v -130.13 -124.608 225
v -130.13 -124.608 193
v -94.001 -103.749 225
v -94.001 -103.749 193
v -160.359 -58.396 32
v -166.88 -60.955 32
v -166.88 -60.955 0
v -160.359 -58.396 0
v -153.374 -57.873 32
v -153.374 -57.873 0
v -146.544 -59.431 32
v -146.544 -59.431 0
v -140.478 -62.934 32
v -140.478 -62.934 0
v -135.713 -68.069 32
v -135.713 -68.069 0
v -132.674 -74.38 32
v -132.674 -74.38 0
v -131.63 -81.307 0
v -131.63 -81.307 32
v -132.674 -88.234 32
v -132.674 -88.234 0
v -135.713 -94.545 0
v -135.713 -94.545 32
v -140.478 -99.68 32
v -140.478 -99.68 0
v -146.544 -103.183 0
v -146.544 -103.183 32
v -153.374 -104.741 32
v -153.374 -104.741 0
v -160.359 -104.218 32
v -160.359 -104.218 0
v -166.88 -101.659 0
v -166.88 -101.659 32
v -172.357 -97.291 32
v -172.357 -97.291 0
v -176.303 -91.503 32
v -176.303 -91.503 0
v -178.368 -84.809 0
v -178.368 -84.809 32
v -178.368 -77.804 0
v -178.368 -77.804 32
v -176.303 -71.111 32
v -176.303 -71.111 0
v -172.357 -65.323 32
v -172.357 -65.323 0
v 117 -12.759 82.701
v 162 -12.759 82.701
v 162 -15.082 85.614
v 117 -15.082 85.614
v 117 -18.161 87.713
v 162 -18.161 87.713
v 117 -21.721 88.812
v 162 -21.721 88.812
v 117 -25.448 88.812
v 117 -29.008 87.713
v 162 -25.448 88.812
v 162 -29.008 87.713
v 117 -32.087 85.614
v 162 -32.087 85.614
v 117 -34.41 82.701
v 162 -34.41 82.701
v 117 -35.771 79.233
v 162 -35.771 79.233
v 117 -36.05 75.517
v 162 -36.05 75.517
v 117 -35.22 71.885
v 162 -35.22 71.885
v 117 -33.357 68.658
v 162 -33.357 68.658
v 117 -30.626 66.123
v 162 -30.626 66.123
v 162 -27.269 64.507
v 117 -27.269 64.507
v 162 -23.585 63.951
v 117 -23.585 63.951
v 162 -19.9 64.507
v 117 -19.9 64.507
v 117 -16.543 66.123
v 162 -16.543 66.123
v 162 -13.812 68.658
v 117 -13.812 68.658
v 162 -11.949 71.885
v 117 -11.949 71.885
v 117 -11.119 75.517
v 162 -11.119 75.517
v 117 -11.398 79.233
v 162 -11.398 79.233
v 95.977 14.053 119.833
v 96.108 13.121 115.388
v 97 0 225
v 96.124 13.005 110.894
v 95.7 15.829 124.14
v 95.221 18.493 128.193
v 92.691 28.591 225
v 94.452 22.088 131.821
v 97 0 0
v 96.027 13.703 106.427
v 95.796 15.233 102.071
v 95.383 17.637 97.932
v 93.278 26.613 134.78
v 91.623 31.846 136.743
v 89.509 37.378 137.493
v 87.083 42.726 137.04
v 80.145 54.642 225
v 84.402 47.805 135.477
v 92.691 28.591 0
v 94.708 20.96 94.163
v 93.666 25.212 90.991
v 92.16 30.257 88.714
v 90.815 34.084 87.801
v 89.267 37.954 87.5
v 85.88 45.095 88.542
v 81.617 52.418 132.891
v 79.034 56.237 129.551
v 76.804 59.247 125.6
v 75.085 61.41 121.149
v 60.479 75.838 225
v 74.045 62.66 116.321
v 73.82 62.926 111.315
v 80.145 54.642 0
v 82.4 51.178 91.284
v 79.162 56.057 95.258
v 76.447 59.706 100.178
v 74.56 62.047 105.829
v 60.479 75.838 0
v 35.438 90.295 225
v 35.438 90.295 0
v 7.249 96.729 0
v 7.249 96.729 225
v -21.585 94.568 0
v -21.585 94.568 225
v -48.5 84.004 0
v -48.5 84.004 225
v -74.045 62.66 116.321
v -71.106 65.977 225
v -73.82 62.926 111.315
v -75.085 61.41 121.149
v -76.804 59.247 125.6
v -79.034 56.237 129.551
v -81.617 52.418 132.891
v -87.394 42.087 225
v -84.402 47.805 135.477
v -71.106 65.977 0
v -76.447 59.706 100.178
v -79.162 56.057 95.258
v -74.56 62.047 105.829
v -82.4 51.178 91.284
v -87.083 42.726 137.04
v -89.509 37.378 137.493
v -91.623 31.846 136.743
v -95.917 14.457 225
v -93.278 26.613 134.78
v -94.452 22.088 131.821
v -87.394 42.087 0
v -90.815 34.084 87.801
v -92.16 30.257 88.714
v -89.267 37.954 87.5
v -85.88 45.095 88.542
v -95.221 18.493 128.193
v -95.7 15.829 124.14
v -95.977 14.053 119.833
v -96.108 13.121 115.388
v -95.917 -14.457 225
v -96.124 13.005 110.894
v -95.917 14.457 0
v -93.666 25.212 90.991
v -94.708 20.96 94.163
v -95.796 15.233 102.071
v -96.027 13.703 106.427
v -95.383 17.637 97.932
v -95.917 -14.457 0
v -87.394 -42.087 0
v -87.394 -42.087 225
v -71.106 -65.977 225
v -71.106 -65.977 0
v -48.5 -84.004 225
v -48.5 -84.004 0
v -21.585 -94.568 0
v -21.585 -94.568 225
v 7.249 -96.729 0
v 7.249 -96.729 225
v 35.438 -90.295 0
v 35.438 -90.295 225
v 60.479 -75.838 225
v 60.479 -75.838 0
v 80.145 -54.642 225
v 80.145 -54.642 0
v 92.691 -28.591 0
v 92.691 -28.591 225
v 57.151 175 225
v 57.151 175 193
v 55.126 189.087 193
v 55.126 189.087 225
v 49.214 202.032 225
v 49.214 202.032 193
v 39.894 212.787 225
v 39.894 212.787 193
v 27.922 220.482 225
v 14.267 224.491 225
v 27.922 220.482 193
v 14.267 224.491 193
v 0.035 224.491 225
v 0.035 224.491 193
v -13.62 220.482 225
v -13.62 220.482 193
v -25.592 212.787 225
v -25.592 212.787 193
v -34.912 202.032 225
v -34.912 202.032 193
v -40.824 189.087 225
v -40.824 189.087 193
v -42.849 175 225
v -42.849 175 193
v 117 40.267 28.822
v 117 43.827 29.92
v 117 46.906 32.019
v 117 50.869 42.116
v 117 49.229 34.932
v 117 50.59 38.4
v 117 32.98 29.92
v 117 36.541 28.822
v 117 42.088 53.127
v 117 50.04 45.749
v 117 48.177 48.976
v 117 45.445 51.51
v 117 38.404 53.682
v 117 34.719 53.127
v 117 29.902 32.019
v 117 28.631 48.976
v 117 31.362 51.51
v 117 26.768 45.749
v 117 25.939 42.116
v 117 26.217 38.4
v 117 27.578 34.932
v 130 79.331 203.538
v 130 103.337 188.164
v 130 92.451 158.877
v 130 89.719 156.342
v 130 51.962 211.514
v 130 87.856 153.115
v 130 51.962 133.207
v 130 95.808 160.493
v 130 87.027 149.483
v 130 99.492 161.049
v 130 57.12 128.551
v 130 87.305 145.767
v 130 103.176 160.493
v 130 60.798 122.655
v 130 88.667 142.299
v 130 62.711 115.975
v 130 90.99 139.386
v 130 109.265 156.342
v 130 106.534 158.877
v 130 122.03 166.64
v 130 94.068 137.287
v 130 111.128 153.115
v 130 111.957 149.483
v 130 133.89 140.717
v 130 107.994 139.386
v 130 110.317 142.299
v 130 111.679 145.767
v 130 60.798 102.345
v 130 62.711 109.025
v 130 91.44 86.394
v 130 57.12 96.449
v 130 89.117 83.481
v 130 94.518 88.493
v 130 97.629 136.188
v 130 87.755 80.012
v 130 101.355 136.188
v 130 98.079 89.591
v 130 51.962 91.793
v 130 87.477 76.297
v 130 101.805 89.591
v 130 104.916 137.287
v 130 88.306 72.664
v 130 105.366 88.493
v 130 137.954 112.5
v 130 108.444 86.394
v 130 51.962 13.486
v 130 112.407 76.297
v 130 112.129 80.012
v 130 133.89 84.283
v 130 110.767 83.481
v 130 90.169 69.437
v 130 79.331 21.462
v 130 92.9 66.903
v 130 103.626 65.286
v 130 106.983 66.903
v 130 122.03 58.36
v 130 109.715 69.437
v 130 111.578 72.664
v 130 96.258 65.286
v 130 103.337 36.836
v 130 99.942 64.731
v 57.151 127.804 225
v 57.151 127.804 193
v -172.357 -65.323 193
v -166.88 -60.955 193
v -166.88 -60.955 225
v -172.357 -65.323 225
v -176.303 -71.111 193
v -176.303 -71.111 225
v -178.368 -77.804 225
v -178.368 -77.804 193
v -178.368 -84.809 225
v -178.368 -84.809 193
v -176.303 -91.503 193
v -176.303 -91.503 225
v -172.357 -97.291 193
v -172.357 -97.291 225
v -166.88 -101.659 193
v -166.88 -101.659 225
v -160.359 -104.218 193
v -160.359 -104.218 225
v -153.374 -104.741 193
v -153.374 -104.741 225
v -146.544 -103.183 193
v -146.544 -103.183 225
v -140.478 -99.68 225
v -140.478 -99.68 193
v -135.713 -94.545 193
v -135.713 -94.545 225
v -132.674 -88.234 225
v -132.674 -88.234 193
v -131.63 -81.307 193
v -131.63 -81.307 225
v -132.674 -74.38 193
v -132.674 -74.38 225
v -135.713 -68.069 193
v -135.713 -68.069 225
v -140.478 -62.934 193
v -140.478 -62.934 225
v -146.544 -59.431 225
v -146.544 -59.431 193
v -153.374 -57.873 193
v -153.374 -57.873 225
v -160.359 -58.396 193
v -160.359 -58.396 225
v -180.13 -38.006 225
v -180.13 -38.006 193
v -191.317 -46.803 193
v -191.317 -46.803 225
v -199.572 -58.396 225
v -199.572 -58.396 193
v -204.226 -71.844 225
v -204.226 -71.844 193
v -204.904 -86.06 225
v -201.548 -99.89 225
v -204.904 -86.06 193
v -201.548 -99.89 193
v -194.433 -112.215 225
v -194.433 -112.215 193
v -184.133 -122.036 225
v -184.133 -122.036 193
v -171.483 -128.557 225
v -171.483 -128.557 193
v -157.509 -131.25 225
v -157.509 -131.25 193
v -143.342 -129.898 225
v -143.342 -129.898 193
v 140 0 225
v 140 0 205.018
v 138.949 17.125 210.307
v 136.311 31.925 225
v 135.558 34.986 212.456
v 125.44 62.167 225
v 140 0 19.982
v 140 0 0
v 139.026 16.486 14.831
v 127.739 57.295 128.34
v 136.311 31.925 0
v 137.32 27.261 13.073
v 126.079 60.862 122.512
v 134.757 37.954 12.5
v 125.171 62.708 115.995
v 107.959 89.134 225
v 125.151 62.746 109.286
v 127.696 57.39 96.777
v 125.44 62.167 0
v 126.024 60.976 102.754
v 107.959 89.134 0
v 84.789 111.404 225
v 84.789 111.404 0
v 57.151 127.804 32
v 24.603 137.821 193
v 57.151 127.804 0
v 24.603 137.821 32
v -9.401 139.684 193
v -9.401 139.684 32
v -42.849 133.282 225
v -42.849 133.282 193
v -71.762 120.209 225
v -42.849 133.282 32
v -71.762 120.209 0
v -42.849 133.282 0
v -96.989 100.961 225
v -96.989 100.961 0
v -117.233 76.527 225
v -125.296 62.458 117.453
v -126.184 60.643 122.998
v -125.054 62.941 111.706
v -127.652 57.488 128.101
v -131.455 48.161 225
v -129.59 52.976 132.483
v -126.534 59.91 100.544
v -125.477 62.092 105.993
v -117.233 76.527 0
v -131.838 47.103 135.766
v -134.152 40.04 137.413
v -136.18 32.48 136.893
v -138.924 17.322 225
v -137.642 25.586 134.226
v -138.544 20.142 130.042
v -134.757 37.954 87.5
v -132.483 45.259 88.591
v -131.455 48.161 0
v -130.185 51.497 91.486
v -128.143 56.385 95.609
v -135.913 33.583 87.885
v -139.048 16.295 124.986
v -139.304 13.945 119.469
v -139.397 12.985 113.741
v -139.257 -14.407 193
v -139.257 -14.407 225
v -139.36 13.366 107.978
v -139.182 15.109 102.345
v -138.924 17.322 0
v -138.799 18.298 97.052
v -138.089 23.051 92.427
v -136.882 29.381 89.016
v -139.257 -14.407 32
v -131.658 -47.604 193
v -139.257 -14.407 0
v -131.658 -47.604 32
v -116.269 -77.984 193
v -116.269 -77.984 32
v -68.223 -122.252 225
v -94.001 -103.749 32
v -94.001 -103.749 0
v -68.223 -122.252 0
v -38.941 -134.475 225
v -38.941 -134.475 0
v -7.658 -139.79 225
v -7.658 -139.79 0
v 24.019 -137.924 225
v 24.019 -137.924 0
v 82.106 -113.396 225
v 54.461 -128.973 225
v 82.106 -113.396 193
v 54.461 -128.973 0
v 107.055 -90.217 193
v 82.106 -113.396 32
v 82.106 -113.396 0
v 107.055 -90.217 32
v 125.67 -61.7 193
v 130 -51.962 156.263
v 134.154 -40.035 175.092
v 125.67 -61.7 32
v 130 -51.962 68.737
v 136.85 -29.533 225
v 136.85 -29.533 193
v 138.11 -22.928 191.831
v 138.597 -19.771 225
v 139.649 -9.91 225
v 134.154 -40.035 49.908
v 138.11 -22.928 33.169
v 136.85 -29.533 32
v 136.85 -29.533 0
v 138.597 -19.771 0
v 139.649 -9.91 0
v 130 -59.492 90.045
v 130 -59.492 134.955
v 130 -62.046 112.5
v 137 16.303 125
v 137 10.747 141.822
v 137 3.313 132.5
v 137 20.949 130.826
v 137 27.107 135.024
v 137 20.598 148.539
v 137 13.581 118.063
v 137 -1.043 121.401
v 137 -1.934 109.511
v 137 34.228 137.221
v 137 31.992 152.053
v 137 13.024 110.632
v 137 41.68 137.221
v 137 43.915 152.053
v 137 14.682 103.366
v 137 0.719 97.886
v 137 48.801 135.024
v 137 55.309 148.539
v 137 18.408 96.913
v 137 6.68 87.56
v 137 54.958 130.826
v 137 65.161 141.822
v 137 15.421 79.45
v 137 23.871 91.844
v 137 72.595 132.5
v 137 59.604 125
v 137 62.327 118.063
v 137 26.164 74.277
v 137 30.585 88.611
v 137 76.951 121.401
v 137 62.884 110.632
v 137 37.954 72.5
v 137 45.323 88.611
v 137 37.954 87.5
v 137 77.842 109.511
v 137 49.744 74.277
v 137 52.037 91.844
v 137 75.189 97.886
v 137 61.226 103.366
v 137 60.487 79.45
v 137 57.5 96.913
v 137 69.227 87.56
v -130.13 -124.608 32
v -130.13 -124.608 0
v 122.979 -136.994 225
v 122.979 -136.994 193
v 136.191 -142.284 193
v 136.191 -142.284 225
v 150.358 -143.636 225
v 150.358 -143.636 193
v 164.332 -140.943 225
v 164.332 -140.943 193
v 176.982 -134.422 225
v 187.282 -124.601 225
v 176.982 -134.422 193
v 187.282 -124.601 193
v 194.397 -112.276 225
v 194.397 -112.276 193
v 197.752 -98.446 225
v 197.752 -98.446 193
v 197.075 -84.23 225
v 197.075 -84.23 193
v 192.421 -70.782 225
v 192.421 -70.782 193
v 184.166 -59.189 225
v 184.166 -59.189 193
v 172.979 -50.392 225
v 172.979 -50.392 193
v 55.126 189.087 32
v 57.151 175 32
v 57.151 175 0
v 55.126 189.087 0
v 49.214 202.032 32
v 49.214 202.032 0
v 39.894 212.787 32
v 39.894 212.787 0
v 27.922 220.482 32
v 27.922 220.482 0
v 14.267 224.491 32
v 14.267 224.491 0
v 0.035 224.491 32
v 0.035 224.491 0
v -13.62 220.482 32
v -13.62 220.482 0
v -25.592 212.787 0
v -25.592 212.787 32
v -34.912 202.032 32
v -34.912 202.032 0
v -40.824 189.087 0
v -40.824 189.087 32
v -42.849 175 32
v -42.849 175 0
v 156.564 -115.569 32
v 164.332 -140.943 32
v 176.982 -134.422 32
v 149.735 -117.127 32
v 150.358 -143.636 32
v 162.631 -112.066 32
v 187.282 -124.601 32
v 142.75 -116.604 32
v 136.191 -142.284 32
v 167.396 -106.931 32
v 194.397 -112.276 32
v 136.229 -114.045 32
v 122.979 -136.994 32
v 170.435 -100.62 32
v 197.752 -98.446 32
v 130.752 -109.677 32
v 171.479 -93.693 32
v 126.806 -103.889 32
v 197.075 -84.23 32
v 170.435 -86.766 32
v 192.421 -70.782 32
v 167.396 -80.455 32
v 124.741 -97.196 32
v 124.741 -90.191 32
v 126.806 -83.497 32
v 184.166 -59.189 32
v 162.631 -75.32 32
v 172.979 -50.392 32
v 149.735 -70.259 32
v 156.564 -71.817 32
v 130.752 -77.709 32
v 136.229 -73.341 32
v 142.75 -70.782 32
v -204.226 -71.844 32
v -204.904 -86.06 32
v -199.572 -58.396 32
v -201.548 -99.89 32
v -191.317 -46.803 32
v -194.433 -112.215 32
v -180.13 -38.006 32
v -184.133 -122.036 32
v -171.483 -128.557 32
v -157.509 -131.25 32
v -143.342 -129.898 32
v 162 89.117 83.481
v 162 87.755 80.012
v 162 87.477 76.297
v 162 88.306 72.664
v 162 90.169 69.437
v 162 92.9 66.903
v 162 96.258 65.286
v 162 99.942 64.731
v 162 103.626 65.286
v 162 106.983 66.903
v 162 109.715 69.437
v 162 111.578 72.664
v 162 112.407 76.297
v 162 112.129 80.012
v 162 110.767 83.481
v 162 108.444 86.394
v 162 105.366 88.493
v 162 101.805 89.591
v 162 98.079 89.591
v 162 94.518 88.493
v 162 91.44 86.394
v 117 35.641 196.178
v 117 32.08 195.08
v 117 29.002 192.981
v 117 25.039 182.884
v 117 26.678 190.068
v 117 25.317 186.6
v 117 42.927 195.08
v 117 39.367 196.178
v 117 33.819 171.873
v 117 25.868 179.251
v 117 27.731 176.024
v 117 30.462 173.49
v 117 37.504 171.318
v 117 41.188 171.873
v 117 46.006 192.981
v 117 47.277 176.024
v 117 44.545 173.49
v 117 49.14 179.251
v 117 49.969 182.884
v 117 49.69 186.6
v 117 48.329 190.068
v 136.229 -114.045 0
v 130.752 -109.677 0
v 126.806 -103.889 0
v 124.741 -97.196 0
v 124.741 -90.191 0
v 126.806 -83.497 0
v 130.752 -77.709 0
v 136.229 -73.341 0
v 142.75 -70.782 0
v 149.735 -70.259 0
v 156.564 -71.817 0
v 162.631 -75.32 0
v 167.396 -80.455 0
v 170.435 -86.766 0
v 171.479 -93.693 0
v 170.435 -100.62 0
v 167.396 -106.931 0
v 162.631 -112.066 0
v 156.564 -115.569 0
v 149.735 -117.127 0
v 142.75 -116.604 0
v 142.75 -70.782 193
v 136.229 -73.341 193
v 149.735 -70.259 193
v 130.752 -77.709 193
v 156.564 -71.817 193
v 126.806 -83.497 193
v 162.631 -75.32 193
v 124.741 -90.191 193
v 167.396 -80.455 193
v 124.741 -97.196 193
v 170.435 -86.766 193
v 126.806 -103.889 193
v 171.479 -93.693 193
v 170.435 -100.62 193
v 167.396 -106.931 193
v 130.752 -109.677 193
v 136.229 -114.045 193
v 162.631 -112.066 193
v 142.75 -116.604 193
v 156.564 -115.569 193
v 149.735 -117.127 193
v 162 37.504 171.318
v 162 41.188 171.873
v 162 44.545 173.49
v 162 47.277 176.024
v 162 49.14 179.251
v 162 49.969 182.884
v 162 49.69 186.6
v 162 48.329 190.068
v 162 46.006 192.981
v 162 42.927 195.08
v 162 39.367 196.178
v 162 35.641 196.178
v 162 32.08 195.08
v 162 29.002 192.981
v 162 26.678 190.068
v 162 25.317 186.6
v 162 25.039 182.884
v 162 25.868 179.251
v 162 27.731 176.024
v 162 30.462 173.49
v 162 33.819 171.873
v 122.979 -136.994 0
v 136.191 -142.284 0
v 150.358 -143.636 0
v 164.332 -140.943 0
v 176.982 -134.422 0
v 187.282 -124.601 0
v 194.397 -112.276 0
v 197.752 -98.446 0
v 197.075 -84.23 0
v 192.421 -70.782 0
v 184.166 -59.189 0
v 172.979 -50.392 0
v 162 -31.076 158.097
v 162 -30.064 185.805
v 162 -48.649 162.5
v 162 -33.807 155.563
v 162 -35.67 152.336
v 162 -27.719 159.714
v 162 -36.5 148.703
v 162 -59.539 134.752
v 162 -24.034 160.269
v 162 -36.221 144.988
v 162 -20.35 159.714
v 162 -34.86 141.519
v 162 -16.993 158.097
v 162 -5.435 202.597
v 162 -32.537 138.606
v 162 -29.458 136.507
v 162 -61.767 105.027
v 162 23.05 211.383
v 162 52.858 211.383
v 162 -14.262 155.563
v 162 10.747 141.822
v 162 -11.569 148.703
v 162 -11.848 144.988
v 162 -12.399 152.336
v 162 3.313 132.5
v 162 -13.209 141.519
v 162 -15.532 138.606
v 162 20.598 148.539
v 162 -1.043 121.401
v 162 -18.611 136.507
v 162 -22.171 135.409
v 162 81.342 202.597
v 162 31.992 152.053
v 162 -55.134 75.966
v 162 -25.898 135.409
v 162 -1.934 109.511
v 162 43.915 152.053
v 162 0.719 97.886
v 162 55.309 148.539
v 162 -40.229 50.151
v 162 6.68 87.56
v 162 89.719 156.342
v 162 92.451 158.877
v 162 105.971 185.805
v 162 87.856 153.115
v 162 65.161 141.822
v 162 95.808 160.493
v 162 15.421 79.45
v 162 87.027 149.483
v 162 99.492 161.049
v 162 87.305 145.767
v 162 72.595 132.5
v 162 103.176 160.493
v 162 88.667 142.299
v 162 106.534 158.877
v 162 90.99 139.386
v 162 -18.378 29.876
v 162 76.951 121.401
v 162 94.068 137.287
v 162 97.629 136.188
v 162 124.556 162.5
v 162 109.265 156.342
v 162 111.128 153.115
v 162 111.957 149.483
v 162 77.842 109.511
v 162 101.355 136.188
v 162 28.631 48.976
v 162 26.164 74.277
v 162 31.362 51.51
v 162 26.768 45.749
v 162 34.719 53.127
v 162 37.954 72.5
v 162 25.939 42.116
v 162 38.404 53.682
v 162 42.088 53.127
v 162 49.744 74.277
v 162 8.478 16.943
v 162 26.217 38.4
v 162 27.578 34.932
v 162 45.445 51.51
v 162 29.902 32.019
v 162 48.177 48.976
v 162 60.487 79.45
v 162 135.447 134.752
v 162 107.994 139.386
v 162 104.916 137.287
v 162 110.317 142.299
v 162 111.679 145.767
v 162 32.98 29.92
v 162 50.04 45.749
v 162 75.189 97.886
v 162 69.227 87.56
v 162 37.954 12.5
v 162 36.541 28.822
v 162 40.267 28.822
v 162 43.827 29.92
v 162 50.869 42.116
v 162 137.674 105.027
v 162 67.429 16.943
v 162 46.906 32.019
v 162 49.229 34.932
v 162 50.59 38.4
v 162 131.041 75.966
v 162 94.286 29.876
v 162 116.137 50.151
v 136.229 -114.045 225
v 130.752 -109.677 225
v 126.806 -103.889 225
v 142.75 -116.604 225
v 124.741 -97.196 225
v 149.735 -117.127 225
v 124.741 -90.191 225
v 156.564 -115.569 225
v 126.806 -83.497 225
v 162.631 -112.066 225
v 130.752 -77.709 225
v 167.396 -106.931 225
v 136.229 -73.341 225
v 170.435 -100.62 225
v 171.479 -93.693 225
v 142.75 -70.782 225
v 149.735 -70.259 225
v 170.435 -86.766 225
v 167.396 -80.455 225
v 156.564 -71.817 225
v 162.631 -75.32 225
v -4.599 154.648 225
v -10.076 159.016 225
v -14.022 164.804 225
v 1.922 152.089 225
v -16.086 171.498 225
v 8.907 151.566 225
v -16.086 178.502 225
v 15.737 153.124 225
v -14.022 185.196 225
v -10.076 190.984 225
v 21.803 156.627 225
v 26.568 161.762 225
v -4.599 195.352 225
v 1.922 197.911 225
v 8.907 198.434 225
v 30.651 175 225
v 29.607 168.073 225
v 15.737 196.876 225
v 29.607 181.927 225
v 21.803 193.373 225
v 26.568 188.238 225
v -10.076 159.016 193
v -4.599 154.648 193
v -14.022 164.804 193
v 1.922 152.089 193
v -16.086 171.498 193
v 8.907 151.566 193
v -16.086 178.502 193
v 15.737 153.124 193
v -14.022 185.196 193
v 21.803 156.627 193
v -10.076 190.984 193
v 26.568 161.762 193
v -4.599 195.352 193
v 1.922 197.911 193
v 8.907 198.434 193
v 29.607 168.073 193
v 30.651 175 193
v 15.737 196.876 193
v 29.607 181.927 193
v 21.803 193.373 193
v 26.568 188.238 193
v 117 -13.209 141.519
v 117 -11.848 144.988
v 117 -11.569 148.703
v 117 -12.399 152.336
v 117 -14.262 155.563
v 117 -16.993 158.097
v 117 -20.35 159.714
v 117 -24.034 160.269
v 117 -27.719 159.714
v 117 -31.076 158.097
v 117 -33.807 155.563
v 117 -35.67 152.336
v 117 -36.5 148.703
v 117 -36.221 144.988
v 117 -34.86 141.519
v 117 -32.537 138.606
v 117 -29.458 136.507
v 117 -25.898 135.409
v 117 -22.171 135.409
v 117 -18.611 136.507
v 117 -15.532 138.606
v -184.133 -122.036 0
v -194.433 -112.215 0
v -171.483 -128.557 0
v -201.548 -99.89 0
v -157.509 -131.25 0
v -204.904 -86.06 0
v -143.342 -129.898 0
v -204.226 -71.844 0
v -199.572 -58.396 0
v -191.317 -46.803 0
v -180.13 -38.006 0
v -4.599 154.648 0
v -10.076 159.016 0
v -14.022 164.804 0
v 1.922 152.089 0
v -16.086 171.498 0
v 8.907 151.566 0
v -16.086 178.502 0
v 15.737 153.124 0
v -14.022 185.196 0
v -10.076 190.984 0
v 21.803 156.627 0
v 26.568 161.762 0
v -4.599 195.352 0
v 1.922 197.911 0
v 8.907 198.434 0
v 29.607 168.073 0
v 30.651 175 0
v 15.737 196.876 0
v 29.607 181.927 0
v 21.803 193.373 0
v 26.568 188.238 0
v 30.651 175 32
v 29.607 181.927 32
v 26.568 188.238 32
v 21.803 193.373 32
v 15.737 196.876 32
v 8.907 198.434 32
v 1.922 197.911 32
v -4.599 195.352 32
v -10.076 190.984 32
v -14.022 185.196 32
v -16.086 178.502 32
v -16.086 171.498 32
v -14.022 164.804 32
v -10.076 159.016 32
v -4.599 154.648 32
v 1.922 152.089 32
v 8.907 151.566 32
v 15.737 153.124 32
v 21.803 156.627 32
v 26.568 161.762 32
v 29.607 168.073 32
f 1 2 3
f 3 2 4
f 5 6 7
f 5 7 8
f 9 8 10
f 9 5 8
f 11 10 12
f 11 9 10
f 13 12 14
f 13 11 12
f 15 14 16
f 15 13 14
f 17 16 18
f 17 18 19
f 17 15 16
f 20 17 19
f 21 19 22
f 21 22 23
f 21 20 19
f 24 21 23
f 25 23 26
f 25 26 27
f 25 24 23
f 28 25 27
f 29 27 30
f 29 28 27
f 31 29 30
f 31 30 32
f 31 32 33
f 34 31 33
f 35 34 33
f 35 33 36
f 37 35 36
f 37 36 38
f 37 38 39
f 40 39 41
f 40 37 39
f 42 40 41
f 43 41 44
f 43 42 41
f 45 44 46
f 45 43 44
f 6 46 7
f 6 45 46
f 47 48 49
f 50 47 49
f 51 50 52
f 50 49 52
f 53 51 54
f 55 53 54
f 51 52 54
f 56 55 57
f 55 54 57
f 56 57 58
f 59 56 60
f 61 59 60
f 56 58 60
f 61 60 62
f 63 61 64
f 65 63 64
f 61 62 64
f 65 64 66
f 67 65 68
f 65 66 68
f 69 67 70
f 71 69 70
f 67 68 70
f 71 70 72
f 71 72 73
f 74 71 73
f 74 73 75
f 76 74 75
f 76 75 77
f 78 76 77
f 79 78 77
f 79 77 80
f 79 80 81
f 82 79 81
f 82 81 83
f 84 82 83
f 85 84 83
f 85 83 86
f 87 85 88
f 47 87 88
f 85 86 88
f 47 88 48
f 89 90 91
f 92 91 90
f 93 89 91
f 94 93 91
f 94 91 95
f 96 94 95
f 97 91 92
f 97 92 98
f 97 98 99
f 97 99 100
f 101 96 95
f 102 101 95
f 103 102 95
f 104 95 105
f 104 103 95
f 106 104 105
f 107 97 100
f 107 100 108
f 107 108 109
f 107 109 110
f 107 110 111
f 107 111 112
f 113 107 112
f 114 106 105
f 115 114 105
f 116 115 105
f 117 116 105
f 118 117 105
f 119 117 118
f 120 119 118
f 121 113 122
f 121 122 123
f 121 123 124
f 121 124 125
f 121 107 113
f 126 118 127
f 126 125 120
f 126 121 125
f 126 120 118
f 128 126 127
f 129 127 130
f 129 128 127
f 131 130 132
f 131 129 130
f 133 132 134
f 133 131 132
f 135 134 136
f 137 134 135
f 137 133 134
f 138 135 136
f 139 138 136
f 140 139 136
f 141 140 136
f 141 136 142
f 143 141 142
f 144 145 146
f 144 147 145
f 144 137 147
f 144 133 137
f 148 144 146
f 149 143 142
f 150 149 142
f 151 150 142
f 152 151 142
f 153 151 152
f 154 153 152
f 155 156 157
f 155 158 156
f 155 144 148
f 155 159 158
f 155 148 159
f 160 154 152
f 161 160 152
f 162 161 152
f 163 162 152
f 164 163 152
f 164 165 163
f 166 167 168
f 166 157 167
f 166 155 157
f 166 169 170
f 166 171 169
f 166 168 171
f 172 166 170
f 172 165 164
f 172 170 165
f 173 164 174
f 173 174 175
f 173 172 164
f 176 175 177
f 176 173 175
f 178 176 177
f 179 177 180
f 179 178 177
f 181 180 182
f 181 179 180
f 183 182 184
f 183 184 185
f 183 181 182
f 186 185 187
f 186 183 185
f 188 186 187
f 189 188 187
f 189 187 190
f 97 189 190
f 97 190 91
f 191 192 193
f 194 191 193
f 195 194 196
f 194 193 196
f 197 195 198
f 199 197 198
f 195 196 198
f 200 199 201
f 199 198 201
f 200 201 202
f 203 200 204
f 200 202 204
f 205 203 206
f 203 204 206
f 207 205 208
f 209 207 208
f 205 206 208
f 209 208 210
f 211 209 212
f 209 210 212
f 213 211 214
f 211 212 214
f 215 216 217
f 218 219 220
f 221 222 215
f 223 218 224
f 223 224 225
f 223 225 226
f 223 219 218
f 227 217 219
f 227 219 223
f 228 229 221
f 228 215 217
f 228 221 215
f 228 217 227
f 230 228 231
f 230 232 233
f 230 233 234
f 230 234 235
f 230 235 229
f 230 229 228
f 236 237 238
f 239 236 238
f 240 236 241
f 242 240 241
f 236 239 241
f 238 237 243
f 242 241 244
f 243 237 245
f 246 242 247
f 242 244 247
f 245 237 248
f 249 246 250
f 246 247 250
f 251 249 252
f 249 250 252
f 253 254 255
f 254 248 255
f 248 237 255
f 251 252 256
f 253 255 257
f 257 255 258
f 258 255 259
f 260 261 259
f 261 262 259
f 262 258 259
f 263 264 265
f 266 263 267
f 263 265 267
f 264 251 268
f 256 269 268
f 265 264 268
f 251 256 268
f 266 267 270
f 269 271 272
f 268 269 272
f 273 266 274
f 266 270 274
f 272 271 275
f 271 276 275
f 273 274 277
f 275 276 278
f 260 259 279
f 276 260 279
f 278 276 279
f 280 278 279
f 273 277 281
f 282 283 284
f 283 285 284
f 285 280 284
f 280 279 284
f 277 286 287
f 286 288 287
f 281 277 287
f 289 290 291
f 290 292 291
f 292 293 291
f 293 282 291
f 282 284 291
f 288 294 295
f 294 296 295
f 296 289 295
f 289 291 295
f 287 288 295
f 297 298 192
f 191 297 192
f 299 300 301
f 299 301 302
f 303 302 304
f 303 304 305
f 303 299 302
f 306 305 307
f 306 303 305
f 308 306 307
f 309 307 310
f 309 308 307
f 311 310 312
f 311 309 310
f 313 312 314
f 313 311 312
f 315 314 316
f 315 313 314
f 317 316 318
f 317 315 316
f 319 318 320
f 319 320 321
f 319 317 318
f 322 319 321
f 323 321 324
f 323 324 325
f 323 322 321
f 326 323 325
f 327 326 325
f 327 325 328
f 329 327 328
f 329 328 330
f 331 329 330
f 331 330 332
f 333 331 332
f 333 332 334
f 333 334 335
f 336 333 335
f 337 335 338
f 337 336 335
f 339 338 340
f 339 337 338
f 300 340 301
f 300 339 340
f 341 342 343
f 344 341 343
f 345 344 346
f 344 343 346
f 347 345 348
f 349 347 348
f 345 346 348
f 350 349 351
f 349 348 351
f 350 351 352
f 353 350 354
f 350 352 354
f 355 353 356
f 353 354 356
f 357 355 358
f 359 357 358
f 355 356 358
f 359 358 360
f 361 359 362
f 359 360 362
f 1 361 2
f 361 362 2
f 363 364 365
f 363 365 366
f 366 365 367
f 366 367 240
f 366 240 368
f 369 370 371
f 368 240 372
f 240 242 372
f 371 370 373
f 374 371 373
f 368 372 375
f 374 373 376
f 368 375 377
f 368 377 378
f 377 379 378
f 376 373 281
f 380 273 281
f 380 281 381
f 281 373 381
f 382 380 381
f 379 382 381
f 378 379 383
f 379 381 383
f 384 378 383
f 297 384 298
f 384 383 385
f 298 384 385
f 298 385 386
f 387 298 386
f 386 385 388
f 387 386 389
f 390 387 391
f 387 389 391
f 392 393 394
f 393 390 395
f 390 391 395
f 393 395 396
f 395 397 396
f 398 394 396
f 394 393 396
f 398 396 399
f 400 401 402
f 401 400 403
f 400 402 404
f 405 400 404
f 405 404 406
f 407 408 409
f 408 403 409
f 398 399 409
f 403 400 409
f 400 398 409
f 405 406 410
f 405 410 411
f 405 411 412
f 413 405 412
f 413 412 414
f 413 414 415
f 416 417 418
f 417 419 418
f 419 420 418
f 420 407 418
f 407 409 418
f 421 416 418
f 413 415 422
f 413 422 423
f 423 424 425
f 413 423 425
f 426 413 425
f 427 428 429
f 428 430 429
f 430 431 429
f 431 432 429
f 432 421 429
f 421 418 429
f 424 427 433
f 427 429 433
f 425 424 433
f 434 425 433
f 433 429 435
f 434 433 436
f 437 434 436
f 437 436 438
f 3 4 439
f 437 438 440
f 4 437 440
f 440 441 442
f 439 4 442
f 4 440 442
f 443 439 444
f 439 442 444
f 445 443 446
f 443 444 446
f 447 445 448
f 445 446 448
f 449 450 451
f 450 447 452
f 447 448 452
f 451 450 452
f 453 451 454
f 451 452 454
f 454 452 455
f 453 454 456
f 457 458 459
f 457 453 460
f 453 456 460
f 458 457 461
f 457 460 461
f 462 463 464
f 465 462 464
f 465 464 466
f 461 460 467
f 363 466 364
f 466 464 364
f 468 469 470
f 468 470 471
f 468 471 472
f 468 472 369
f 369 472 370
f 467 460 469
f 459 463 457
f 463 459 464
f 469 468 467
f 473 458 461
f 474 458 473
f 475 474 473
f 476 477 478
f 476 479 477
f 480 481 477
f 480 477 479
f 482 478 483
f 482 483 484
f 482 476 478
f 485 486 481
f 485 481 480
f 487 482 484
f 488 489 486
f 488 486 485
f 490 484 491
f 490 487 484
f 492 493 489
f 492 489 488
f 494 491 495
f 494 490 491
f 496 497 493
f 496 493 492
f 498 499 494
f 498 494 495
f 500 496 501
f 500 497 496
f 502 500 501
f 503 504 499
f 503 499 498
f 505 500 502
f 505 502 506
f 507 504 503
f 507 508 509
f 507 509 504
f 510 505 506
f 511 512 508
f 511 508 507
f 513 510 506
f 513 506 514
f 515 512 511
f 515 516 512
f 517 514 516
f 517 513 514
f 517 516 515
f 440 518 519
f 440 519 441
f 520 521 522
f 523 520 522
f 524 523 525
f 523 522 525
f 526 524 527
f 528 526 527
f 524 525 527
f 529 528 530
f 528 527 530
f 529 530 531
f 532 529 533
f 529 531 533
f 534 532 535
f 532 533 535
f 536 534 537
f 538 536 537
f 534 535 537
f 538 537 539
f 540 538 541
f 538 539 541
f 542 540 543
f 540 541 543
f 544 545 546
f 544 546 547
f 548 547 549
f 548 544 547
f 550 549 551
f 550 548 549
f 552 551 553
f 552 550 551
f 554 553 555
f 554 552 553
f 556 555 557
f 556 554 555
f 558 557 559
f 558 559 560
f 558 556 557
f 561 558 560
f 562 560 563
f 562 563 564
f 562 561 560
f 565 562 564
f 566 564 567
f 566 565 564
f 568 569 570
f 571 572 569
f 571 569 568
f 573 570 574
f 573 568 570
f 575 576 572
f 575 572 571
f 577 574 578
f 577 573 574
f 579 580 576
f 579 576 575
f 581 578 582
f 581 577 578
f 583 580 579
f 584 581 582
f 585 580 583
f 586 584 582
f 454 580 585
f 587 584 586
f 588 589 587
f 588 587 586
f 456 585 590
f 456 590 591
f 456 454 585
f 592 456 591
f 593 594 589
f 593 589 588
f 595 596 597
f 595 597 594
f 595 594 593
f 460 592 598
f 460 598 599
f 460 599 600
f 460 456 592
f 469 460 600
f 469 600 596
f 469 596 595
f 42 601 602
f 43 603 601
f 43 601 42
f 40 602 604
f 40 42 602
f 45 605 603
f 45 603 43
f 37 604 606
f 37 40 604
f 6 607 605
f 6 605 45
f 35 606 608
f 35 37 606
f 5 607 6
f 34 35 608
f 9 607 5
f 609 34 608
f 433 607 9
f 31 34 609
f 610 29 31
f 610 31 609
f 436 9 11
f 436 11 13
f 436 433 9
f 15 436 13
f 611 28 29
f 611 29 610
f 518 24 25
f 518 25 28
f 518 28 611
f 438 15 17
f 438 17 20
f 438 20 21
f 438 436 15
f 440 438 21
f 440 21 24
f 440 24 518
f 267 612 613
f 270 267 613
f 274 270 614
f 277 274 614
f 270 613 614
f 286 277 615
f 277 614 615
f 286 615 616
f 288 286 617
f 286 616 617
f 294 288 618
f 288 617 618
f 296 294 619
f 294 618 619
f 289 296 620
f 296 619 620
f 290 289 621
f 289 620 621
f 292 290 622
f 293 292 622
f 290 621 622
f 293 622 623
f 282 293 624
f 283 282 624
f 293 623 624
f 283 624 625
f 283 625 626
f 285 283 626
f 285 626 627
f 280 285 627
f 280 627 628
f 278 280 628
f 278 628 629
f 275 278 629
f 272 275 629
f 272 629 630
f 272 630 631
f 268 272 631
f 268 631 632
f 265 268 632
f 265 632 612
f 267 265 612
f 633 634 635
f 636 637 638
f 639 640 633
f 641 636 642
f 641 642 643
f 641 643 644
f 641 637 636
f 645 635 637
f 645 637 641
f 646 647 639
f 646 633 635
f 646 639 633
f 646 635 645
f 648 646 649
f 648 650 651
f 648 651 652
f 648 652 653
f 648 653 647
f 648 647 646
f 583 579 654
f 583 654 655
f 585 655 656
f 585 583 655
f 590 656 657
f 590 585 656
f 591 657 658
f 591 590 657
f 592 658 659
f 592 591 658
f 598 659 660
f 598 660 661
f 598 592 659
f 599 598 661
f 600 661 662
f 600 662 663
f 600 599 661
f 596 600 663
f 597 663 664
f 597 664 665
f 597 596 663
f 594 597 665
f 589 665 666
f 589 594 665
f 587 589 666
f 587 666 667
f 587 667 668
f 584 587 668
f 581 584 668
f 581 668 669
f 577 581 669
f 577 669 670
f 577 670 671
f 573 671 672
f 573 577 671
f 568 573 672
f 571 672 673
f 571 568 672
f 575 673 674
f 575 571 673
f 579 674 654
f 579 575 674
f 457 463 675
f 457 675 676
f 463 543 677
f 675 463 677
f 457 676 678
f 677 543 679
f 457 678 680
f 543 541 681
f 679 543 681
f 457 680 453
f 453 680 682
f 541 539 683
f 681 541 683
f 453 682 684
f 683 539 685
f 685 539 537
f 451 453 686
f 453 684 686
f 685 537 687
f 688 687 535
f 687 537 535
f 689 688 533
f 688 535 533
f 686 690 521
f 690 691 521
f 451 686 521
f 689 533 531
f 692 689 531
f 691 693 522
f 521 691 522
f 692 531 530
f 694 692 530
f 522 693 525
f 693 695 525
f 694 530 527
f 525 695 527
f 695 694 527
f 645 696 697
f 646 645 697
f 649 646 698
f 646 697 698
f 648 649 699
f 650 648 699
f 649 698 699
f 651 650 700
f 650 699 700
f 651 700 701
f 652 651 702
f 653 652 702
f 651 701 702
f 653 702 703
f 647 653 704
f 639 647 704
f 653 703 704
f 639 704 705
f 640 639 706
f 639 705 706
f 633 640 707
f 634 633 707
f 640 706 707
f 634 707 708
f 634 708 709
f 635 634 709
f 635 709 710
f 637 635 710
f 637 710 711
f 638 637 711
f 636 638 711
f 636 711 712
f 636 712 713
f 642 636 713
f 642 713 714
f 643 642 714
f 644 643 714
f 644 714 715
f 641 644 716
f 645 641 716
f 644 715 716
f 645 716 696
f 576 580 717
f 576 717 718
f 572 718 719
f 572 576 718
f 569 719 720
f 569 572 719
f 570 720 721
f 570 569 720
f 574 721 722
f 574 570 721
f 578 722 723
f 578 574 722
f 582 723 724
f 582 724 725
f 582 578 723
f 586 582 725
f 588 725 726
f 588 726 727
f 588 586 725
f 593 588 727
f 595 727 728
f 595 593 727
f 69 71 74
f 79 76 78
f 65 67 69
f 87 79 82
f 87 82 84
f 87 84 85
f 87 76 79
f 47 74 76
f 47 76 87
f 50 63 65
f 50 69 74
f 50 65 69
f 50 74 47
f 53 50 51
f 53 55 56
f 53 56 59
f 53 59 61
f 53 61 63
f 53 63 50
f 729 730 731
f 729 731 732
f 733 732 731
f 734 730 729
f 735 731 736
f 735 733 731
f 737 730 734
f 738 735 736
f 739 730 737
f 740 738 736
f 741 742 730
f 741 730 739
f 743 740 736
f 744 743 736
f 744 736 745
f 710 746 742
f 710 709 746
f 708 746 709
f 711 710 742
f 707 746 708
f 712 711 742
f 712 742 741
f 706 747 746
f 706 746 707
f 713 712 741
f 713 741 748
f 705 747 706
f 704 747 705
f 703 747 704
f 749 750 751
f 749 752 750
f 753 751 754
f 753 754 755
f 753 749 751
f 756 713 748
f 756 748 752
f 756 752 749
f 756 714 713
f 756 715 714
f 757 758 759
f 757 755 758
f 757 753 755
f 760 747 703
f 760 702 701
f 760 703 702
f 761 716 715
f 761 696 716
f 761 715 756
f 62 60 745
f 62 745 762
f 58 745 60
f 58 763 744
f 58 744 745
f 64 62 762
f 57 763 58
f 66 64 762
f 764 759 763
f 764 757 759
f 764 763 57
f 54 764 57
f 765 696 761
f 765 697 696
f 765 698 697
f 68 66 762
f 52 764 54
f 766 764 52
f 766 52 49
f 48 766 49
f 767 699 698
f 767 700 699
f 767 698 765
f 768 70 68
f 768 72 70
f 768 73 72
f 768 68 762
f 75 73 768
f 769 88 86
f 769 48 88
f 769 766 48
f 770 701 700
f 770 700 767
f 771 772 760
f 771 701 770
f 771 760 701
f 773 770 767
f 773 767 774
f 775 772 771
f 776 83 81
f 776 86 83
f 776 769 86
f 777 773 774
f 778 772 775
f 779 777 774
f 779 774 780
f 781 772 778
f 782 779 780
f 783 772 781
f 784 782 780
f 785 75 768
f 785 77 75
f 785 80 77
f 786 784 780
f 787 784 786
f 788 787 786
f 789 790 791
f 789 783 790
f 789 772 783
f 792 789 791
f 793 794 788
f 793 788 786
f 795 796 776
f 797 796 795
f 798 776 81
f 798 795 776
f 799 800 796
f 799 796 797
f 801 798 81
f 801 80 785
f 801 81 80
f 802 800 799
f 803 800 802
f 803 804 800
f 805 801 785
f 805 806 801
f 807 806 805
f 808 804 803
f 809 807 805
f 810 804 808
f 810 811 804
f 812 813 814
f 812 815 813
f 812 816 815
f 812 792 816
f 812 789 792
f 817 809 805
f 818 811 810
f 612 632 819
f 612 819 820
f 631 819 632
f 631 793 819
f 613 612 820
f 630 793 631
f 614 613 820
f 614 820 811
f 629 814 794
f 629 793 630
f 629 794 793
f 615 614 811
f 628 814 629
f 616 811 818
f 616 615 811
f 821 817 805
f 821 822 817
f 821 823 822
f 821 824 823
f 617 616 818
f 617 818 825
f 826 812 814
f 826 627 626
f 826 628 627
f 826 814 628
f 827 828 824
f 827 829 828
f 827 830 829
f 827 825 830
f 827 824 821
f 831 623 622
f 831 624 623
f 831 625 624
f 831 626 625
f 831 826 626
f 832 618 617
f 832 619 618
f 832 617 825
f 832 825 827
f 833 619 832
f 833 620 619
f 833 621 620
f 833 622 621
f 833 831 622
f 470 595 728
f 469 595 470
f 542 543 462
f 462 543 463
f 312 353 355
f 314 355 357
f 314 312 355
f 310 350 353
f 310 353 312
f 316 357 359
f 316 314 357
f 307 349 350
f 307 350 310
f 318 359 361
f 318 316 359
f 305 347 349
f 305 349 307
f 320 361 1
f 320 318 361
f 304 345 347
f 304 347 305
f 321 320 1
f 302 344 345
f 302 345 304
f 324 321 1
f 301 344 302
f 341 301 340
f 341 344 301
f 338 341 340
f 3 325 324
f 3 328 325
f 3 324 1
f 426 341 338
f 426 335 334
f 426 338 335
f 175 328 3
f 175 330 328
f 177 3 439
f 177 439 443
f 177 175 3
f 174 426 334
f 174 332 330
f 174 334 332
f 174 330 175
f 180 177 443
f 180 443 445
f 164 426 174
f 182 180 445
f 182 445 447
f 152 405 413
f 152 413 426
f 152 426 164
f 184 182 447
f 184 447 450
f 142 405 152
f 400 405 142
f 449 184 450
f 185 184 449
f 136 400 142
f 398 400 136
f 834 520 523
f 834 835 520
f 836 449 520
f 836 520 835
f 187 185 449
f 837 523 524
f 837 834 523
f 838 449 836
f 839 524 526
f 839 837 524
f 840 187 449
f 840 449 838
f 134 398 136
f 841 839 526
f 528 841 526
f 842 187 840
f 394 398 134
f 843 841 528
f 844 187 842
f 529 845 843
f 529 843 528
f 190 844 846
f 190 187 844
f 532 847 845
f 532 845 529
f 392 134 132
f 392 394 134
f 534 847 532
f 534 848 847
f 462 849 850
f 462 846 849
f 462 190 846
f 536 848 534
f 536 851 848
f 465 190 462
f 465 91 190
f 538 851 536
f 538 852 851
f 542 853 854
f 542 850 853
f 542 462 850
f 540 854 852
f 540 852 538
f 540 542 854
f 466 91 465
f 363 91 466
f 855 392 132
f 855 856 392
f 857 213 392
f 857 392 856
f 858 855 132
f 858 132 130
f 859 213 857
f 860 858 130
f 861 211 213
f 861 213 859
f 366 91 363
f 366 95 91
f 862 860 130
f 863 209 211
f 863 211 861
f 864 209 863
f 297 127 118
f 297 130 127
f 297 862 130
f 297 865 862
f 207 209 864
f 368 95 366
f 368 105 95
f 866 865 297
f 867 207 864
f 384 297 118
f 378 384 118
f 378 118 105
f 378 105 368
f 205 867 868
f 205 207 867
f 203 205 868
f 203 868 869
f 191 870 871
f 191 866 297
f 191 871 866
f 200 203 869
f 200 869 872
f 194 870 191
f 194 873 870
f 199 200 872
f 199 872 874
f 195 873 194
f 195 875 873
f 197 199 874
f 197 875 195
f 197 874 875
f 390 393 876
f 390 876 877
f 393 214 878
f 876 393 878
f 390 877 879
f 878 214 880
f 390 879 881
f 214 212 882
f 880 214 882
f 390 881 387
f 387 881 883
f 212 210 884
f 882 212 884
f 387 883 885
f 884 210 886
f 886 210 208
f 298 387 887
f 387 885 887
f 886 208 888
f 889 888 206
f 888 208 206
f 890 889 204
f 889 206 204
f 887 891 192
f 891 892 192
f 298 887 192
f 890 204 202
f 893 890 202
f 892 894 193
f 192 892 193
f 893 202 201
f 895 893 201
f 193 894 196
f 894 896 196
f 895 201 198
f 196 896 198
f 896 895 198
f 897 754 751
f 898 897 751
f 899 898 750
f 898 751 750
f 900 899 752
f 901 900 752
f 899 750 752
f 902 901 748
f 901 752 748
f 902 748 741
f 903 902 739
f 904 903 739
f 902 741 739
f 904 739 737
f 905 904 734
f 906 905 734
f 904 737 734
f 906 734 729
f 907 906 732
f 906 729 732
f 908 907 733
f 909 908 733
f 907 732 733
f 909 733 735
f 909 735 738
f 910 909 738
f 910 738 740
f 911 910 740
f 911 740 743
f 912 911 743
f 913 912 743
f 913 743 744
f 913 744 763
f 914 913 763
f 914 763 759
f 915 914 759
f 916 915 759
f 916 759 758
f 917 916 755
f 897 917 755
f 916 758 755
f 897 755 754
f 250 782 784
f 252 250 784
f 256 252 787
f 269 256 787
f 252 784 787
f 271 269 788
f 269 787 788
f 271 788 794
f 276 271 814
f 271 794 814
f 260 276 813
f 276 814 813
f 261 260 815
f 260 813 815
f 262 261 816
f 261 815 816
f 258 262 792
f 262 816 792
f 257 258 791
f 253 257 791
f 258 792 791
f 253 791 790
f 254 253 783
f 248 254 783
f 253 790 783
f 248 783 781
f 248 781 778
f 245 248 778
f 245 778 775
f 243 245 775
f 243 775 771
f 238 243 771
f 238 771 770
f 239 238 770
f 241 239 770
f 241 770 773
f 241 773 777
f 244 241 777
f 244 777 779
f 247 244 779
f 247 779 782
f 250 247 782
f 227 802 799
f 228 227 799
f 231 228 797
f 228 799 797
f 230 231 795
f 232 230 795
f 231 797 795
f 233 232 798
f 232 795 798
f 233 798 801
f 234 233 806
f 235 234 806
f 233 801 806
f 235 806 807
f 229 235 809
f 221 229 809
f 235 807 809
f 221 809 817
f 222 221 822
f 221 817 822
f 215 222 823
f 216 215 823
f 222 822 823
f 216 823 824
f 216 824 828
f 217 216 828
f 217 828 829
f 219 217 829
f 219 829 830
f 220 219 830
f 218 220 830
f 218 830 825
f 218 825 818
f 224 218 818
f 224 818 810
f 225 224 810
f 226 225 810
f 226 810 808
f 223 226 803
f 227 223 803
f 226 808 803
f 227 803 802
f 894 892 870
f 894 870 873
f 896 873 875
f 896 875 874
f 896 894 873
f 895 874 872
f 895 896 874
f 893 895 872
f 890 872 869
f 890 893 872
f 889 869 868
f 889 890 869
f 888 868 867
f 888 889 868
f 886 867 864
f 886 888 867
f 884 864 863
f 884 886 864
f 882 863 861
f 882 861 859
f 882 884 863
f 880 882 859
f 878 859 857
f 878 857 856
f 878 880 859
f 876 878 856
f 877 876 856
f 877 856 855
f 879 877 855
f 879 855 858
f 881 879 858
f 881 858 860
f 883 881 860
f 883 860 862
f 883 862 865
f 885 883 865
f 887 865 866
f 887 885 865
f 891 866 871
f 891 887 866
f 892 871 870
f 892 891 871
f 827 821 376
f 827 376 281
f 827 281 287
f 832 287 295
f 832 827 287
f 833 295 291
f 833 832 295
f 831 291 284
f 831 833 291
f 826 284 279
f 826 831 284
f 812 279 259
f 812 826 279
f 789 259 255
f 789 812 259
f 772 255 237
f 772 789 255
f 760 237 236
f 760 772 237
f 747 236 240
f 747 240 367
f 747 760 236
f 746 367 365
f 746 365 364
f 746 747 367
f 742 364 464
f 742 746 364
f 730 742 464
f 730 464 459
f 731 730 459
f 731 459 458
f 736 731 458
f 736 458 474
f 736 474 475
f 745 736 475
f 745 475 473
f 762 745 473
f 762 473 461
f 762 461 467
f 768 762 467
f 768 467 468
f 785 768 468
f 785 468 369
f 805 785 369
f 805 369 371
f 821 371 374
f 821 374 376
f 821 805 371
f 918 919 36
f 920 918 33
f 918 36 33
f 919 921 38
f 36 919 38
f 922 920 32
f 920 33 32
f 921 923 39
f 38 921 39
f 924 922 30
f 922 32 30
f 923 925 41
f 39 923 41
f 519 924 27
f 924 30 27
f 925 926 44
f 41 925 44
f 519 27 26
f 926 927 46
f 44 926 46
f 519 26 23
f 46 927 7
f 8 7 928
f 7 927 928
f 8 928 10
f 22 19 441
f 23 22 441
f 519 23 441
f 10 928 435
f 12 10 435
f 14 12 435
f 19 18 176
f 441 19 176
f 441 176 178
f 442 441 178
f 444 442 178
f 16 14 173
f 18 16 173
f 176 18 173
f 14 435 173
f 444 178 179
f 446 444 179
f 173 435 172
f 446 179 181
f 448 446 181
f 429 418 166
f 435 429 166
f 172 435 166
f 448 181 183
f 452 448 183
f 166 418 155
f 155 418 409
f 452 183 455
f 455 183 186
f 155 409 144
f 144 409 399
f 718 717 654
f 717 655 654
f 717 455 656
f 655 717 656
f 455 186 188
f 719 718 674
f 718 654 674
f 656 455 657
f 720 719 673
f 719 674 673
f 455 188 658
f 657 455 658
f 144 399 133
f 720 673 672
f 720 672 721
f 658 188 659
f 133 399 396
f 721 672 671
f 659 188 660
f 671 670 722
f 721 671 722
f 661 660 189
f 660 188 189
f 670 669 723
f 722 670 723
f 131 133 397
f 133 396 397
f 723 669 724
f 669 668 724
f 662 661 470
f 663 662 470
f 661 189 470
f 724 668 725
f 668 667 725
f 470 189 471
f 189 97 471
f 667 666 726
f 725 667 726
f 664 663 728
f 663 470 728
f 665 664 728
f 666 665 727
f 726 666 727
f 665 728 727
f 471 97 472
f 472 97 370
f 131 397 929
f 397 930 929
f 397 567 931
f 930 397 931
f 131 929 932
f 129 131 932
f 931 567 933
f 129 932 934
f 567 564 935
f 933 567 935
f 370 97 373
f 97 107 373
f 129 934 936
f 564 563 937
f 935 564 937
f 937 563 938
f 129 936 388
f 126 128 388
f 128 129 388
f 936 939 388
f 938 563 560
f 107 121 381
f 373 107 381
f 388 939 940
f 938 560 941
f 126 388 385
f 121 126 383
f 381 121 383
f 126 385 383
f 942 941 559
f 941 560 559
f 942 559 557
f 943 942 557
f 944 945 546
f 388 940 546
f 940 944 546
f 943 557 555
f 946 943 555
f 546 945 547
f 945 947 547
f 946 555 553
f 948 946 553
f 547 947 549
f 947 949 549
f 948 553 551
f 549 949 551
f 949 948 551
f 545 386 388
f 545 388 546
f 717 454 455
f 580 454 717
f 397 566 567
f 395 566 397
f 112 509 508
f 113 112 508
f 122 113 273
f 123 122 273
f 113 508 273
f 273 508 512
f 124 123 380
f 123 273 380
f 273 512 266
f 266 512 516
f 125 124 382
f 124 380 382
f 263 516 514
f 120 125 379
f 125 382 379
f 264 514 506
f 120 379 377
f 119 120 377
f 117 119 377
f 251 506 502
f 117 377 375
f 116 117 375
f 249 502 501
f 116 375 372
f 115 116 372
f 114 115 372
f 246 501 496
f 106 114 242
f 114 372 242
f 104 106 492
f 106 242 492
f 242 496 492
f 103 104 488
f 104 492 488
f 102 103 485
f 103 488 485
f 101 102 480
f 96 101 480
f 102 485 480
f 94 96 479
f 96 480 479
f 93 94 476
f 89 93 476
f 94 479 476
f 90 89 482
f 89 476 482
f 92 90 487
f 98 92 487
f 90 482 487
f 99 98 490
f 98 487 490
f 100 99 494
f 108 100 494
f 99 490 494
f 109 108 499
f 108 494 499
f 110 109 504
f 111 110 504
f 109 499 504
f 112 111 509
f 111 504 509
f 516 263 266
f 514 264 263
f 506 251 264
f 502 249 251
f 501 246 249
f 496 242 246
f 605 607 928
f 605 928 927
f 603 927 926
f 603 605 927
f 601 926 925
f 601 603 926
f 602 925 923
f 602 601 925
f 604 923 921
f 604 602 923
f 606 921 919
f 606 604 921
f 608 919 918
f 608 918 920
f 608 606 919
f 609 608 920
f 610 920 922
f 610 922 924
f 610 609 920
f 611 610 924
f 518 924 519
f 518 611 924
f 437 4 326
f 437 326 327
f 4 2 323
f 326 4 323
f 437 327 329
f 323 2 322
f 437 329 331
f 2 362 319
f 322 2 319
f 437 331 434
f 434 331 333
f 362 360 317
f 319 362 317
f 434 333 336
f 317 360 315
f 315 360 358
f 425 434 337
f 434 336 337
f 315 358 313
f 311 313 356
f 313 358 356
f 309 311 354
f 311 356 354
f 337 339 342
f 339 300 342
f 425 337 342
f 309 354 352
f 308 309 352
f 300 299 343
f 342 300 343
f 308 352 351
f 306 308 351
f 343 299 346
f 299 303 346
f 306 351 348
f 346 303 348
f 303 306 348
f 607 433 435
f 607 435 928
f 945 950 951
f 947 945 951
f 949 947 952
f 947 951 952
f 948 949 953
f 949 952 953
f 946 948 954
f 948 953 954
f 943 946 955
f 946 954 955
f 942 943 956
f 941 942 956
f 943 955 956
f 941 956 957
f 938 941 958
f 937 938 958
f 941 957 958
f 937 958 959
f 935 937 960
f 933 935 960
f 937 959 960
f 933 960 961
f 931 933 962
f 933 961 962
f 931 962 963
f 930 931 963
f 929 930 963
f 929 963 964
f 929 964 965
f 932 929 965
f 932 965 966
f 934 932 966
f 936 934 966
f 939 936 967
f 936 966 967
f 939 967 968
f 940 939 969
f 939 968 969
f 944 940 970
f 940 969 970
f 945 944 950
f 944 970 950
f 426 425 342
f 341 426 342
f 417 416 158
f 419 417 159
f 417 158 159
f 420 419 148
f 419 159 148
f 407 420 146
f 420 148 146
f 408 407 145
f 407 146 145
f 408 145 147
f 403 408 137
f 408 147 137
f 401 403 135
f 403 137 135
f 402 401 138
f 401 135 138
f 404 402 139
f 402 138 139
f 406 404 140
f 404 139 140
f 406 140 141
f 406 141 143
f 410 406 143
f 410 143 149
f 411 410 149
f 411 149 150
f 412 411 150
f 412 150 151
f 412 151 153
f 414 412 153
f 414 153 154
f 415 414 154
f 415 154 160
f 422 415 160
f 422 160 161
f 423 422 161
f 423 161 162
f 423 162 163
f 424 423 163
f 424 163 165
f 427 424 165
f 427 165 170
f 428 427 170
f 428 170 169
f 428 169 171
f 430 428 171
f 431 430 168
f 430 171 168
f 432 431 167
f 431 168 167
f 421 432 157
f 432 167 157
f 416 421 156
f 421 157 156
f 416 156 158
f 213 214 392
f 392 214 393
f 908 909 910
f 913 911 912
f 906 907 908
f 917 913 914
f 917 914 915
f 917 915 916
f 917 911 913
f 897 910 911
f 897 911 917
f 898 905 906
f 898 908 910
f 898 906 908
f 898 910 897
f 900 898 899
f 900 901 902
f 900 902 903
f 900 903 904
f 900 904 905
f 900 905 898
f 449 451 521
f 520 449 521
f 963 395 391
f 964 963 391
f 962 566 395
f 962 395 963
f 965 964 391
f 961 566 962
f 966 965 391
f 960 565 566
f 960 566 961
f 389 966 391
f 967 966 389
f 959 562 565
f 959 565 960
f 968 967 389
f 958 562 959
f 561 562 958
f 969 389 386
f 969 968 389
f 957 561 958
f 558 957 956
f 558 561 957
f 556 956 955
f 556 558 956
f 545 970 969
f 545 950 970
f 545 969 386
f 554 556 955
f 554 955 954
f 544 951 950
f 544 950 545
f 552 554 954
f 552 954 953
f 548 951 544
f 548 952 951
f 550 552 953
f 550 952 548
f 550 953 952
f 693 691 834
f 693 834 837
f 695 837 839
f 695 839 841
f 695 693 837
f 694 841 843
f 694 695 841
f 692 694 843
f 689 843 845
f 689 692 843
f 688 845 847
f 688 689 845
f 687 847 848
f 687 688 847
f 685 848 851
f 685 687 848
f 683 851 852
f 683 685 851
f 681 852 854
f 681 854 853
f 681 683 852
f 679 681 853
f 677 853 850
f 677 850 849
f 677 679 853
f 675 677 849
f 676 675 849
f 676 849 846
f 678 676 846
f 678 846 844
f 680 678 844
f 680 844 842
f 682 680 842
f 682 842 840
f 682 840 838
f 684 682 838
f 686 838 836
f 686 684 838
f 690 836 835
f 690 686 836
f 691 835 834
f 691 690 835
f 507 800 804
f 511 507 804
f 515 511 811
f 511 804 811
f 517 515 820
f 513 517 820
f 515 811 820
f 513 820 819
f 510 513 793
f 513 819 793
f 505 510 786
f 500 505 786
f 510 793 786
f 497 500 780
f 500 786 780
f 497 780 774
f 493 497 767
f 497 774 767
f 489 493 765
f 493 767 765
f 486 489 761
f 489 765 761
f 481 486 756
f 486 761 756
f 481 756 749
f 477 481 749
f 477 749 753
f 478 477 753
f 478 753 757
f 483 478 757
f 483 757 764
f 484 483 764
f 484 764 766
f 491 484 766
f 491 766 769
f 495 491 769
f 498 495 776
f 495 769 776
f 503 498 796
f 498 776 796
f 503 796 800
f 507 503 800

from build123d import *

# Parameters (mm, degrees)
ESQUISSE1_R                  = 140
ESQUISSE1_R_2                = 97
BOSS_EXTRU_1_DEPTH           = 225
BOSS_EXTRU_2_START           = -32
ESQUISSE2_R                  = 23.5
BOSS_EXTRU_2_DEPTH           = 32
R_P_TITION_CIRCULAIRE1_COUNT = 3
SYM_TRIE3_START              = -32
SYM_TRIE3_COPY_1_SKETCH_R    = 23.5
SYM_TRIE3_COPY_1_DEPTH       = 32
SYM_TRIE3_COPY_2_SKETCH_R    = 23.5
SYM_TRIE3_COPY_2_DEPTH       = 32
ESQUISSE3_R                  = 100
BOSS_EXTRU_3_DEPTH           = 32
ESQUISSE4_R                  = 40
ENL_V_MAT_EXTRU_1_DEPTH      = 25
ESQUISSE5_R                  = 25
ENL_V_MAT_EXTRU_4_DEPTH      = 468.228990121
ESQUISSE6_R                  = 12.5
ENL_V_MAT_EXTRU_5_DEPTH      = 45
R_P_TITION_CIRCULAIRE2_COUNT = 6


with BuildPart() as part:
    # Esquisse1 → Boss.-Extru.1 (new body)
    with BuildSketch(Plane(origin=(0, 0, 0), x_dir=(0, 1, 0), z_dir=(0, 0, 1))):
        with Locations(Location((0, 0, 0), (0, 0, 270))):
            Circle(ESQUISSE1_R)
        with Locations(Location((0, 0, 0), (0, 0, 270))):
            Circle(ESQUISSE1_R_2, mode=Mode.SUBTRACT)
    extrude(amount=BOSS_EXTRU_1_DEPTH)

    # Esquisse2 → Boss.-Extru.2 (add)
    with BuildSketch(Plane.XY.offset(225).offset(BOSS_EXTRU_2_START)):
        with BuildLine():
            Line((-42.848913936, 175), (-42.848913936, 133.281546264))
            ThreePointArc((-42.848913936, 133.281546264), (7.657681027, 139.790414268), (57.151086064, 127.803573352))
            Line((57.151086064, 127.803573352), (57.151086064, 175))
            ThreePointArc((57.151086064, 175), (7.151086064, 225), (-42.848913936, 175))
        make_face()
        with Locations((7.151086064, 175)):
            Circle(ESQUISSE2_R, mode=Mode.SUBTRACT)
    boss_extru_2 = extrude(amount=BOSS_EXTRU_2_DEPTH)

    # Répétition circulaire1: Boss.-Extru.2 ×3 about axis
    r_p_tition_circulaire1_axis = Axis((0, 0, 0), (0, 0, 1))
    for i in range(1, R_P_TITION_CIRCULAIRE1_COUNT):
        add(boss_extru_2.rotate(r_p_tition_circulaire1_axis, i * 360 / R_P_TITION_CIRCULAIRE1_COUNT))

    # Symétrie3: Boss.-Extru.2 across plane
    add(boss_extru_2.mirror(Plane.XY.offset(112.5)))

    # Symétrie3 copy 1 sketch → Symétrie3 copy 1 (add)
    with BuildSketch(Plane(origin=(0, 0, 0), x_dir=(-0.4999999999999998, 0.8660254037844387, 0), z_dir=(0, 0, -1)).offset(SYM_TRIE3_START)):
        with BuildLine():
            Line((-42.848913936, -175), (-42.848913936, -133.281546264))
            ThreePointArc((-42.848913936, -133.281546264), (7.657681027, -139.790414268), (57.151086064, -127.803573352))
            Line((57.151086064, -127.803573352), (57.151086064, -175))
            ThreePointArc((57.151086064, -175), (7.151086064, -225), (-42.848913936, -175))
        make_face()
        with Locations((7.151086064, -175)):
            Circle(SYM_TRIE3_COPY_1_SKETCH_R, mode=Mode.SUBTRACT)
    extrude(amount=SYM_TRIE3_COPY_1_DEPTH)

    # Symétrie3 copy 2 sketch → Symétrie3 copy 2 (add)
    with BuildSketch(Plane(origin=(0, 0, 0), x_dir=(-0.5000000000000004, -0.8660254037844384, 0), z_dir=(0, 0, -1)).offset(SYM_TRIE3_START)):
        with BuildLine():
            Line((-42.848913936, -175), (-42.848913936, -133.281546264))
            ThreePointArc((-42.848913936, -133.281546264), (7.657681027, -139.790414268), (57.151086064, -127.803573352))
            Line((57.151086064, -127.803573352), (57.151086064, -175))
            ThreePointArc((57.151086064, -175), (7.151086064, -225), (-42.848913936, -175))
        make_face()
        with Locations((7.151086064, -175)):
            Circle(SYM_TRIE3_COPY_2_SKETCH_R, mode=Mode.SUBTRACT)
    extrude(amount=SYM_TRIE3_COPY_2_DEPTH)

    # Esquisse3 → Boss.-Extru.3 (add)
    with BuildSketch(Plane.YZ.offset(162)):
        with Locations(Location((37.953751354, 112.5, 0), (0, 0, 270))):
            Circle(ESQUISSE3_R)
    extrude(amount=-BOSS_EXTRU_3_DEPTH)

    # Esquisse4 → Enlèv. mat.-Extru.1 (cut)
    with BuildSketch(Plane.YZ.offset(162)):
        with Locations(Location((37.953751354, 112.5, 0), (0, 0, 270))):
            Circle(ESQUISSE4_R)
    extrude(amount=-ENL_V_MAT_EXTRU_1_DEPTH, mode=Mode.SUBTRACT)

    # Esquisse5 → Enlèv. mat.-Extru.4 (cut, through all)
    with BuildSketch(Plane.YZ.offset(137)):
        with Locations(Location((37.953751354, 112.5, 0), (0, 0, 270))):
            Circle(ESQUISSE5_R)
    extrude(amount=-ENL_V_MAT_EXTRU_4_DEPTH, mode=Mode.SUBTRACT)

    # Esquisse6 → Enlèv. mat.-Extru.5 (cut)
    with BuildSketch(Plane.YZ.offset(162)):
        with Locations(Location((37.503795096, 183.818066879, 0), (0, 0, 270))):
            Circle(ESQUISSE6_R)
    enl_v_mat_extru_5 = extrude(amount=-ENL_V_MAT_EXTRU_5_DEPTH, mode=Mode.SUBTRACT)

    # Répétition circulaire2: Enlèv. mat.-Extru.5 ×6 about axis
    r_p_tition_circulaire2_axis = Axis((0, 37.953751354, 112.5), (1, 0, 0))
    for i in range(1, R_P_TITION_CIRCULAIRE2_COUNT):
        add(enl_v_mat_extru_5.rotate(r_p_tition_circulaire2_axis, i * 360 / R_P_TITION_CIRCULAIRE2_COUNT), mode=Mode.SUBTRACT)


solid = part.part
